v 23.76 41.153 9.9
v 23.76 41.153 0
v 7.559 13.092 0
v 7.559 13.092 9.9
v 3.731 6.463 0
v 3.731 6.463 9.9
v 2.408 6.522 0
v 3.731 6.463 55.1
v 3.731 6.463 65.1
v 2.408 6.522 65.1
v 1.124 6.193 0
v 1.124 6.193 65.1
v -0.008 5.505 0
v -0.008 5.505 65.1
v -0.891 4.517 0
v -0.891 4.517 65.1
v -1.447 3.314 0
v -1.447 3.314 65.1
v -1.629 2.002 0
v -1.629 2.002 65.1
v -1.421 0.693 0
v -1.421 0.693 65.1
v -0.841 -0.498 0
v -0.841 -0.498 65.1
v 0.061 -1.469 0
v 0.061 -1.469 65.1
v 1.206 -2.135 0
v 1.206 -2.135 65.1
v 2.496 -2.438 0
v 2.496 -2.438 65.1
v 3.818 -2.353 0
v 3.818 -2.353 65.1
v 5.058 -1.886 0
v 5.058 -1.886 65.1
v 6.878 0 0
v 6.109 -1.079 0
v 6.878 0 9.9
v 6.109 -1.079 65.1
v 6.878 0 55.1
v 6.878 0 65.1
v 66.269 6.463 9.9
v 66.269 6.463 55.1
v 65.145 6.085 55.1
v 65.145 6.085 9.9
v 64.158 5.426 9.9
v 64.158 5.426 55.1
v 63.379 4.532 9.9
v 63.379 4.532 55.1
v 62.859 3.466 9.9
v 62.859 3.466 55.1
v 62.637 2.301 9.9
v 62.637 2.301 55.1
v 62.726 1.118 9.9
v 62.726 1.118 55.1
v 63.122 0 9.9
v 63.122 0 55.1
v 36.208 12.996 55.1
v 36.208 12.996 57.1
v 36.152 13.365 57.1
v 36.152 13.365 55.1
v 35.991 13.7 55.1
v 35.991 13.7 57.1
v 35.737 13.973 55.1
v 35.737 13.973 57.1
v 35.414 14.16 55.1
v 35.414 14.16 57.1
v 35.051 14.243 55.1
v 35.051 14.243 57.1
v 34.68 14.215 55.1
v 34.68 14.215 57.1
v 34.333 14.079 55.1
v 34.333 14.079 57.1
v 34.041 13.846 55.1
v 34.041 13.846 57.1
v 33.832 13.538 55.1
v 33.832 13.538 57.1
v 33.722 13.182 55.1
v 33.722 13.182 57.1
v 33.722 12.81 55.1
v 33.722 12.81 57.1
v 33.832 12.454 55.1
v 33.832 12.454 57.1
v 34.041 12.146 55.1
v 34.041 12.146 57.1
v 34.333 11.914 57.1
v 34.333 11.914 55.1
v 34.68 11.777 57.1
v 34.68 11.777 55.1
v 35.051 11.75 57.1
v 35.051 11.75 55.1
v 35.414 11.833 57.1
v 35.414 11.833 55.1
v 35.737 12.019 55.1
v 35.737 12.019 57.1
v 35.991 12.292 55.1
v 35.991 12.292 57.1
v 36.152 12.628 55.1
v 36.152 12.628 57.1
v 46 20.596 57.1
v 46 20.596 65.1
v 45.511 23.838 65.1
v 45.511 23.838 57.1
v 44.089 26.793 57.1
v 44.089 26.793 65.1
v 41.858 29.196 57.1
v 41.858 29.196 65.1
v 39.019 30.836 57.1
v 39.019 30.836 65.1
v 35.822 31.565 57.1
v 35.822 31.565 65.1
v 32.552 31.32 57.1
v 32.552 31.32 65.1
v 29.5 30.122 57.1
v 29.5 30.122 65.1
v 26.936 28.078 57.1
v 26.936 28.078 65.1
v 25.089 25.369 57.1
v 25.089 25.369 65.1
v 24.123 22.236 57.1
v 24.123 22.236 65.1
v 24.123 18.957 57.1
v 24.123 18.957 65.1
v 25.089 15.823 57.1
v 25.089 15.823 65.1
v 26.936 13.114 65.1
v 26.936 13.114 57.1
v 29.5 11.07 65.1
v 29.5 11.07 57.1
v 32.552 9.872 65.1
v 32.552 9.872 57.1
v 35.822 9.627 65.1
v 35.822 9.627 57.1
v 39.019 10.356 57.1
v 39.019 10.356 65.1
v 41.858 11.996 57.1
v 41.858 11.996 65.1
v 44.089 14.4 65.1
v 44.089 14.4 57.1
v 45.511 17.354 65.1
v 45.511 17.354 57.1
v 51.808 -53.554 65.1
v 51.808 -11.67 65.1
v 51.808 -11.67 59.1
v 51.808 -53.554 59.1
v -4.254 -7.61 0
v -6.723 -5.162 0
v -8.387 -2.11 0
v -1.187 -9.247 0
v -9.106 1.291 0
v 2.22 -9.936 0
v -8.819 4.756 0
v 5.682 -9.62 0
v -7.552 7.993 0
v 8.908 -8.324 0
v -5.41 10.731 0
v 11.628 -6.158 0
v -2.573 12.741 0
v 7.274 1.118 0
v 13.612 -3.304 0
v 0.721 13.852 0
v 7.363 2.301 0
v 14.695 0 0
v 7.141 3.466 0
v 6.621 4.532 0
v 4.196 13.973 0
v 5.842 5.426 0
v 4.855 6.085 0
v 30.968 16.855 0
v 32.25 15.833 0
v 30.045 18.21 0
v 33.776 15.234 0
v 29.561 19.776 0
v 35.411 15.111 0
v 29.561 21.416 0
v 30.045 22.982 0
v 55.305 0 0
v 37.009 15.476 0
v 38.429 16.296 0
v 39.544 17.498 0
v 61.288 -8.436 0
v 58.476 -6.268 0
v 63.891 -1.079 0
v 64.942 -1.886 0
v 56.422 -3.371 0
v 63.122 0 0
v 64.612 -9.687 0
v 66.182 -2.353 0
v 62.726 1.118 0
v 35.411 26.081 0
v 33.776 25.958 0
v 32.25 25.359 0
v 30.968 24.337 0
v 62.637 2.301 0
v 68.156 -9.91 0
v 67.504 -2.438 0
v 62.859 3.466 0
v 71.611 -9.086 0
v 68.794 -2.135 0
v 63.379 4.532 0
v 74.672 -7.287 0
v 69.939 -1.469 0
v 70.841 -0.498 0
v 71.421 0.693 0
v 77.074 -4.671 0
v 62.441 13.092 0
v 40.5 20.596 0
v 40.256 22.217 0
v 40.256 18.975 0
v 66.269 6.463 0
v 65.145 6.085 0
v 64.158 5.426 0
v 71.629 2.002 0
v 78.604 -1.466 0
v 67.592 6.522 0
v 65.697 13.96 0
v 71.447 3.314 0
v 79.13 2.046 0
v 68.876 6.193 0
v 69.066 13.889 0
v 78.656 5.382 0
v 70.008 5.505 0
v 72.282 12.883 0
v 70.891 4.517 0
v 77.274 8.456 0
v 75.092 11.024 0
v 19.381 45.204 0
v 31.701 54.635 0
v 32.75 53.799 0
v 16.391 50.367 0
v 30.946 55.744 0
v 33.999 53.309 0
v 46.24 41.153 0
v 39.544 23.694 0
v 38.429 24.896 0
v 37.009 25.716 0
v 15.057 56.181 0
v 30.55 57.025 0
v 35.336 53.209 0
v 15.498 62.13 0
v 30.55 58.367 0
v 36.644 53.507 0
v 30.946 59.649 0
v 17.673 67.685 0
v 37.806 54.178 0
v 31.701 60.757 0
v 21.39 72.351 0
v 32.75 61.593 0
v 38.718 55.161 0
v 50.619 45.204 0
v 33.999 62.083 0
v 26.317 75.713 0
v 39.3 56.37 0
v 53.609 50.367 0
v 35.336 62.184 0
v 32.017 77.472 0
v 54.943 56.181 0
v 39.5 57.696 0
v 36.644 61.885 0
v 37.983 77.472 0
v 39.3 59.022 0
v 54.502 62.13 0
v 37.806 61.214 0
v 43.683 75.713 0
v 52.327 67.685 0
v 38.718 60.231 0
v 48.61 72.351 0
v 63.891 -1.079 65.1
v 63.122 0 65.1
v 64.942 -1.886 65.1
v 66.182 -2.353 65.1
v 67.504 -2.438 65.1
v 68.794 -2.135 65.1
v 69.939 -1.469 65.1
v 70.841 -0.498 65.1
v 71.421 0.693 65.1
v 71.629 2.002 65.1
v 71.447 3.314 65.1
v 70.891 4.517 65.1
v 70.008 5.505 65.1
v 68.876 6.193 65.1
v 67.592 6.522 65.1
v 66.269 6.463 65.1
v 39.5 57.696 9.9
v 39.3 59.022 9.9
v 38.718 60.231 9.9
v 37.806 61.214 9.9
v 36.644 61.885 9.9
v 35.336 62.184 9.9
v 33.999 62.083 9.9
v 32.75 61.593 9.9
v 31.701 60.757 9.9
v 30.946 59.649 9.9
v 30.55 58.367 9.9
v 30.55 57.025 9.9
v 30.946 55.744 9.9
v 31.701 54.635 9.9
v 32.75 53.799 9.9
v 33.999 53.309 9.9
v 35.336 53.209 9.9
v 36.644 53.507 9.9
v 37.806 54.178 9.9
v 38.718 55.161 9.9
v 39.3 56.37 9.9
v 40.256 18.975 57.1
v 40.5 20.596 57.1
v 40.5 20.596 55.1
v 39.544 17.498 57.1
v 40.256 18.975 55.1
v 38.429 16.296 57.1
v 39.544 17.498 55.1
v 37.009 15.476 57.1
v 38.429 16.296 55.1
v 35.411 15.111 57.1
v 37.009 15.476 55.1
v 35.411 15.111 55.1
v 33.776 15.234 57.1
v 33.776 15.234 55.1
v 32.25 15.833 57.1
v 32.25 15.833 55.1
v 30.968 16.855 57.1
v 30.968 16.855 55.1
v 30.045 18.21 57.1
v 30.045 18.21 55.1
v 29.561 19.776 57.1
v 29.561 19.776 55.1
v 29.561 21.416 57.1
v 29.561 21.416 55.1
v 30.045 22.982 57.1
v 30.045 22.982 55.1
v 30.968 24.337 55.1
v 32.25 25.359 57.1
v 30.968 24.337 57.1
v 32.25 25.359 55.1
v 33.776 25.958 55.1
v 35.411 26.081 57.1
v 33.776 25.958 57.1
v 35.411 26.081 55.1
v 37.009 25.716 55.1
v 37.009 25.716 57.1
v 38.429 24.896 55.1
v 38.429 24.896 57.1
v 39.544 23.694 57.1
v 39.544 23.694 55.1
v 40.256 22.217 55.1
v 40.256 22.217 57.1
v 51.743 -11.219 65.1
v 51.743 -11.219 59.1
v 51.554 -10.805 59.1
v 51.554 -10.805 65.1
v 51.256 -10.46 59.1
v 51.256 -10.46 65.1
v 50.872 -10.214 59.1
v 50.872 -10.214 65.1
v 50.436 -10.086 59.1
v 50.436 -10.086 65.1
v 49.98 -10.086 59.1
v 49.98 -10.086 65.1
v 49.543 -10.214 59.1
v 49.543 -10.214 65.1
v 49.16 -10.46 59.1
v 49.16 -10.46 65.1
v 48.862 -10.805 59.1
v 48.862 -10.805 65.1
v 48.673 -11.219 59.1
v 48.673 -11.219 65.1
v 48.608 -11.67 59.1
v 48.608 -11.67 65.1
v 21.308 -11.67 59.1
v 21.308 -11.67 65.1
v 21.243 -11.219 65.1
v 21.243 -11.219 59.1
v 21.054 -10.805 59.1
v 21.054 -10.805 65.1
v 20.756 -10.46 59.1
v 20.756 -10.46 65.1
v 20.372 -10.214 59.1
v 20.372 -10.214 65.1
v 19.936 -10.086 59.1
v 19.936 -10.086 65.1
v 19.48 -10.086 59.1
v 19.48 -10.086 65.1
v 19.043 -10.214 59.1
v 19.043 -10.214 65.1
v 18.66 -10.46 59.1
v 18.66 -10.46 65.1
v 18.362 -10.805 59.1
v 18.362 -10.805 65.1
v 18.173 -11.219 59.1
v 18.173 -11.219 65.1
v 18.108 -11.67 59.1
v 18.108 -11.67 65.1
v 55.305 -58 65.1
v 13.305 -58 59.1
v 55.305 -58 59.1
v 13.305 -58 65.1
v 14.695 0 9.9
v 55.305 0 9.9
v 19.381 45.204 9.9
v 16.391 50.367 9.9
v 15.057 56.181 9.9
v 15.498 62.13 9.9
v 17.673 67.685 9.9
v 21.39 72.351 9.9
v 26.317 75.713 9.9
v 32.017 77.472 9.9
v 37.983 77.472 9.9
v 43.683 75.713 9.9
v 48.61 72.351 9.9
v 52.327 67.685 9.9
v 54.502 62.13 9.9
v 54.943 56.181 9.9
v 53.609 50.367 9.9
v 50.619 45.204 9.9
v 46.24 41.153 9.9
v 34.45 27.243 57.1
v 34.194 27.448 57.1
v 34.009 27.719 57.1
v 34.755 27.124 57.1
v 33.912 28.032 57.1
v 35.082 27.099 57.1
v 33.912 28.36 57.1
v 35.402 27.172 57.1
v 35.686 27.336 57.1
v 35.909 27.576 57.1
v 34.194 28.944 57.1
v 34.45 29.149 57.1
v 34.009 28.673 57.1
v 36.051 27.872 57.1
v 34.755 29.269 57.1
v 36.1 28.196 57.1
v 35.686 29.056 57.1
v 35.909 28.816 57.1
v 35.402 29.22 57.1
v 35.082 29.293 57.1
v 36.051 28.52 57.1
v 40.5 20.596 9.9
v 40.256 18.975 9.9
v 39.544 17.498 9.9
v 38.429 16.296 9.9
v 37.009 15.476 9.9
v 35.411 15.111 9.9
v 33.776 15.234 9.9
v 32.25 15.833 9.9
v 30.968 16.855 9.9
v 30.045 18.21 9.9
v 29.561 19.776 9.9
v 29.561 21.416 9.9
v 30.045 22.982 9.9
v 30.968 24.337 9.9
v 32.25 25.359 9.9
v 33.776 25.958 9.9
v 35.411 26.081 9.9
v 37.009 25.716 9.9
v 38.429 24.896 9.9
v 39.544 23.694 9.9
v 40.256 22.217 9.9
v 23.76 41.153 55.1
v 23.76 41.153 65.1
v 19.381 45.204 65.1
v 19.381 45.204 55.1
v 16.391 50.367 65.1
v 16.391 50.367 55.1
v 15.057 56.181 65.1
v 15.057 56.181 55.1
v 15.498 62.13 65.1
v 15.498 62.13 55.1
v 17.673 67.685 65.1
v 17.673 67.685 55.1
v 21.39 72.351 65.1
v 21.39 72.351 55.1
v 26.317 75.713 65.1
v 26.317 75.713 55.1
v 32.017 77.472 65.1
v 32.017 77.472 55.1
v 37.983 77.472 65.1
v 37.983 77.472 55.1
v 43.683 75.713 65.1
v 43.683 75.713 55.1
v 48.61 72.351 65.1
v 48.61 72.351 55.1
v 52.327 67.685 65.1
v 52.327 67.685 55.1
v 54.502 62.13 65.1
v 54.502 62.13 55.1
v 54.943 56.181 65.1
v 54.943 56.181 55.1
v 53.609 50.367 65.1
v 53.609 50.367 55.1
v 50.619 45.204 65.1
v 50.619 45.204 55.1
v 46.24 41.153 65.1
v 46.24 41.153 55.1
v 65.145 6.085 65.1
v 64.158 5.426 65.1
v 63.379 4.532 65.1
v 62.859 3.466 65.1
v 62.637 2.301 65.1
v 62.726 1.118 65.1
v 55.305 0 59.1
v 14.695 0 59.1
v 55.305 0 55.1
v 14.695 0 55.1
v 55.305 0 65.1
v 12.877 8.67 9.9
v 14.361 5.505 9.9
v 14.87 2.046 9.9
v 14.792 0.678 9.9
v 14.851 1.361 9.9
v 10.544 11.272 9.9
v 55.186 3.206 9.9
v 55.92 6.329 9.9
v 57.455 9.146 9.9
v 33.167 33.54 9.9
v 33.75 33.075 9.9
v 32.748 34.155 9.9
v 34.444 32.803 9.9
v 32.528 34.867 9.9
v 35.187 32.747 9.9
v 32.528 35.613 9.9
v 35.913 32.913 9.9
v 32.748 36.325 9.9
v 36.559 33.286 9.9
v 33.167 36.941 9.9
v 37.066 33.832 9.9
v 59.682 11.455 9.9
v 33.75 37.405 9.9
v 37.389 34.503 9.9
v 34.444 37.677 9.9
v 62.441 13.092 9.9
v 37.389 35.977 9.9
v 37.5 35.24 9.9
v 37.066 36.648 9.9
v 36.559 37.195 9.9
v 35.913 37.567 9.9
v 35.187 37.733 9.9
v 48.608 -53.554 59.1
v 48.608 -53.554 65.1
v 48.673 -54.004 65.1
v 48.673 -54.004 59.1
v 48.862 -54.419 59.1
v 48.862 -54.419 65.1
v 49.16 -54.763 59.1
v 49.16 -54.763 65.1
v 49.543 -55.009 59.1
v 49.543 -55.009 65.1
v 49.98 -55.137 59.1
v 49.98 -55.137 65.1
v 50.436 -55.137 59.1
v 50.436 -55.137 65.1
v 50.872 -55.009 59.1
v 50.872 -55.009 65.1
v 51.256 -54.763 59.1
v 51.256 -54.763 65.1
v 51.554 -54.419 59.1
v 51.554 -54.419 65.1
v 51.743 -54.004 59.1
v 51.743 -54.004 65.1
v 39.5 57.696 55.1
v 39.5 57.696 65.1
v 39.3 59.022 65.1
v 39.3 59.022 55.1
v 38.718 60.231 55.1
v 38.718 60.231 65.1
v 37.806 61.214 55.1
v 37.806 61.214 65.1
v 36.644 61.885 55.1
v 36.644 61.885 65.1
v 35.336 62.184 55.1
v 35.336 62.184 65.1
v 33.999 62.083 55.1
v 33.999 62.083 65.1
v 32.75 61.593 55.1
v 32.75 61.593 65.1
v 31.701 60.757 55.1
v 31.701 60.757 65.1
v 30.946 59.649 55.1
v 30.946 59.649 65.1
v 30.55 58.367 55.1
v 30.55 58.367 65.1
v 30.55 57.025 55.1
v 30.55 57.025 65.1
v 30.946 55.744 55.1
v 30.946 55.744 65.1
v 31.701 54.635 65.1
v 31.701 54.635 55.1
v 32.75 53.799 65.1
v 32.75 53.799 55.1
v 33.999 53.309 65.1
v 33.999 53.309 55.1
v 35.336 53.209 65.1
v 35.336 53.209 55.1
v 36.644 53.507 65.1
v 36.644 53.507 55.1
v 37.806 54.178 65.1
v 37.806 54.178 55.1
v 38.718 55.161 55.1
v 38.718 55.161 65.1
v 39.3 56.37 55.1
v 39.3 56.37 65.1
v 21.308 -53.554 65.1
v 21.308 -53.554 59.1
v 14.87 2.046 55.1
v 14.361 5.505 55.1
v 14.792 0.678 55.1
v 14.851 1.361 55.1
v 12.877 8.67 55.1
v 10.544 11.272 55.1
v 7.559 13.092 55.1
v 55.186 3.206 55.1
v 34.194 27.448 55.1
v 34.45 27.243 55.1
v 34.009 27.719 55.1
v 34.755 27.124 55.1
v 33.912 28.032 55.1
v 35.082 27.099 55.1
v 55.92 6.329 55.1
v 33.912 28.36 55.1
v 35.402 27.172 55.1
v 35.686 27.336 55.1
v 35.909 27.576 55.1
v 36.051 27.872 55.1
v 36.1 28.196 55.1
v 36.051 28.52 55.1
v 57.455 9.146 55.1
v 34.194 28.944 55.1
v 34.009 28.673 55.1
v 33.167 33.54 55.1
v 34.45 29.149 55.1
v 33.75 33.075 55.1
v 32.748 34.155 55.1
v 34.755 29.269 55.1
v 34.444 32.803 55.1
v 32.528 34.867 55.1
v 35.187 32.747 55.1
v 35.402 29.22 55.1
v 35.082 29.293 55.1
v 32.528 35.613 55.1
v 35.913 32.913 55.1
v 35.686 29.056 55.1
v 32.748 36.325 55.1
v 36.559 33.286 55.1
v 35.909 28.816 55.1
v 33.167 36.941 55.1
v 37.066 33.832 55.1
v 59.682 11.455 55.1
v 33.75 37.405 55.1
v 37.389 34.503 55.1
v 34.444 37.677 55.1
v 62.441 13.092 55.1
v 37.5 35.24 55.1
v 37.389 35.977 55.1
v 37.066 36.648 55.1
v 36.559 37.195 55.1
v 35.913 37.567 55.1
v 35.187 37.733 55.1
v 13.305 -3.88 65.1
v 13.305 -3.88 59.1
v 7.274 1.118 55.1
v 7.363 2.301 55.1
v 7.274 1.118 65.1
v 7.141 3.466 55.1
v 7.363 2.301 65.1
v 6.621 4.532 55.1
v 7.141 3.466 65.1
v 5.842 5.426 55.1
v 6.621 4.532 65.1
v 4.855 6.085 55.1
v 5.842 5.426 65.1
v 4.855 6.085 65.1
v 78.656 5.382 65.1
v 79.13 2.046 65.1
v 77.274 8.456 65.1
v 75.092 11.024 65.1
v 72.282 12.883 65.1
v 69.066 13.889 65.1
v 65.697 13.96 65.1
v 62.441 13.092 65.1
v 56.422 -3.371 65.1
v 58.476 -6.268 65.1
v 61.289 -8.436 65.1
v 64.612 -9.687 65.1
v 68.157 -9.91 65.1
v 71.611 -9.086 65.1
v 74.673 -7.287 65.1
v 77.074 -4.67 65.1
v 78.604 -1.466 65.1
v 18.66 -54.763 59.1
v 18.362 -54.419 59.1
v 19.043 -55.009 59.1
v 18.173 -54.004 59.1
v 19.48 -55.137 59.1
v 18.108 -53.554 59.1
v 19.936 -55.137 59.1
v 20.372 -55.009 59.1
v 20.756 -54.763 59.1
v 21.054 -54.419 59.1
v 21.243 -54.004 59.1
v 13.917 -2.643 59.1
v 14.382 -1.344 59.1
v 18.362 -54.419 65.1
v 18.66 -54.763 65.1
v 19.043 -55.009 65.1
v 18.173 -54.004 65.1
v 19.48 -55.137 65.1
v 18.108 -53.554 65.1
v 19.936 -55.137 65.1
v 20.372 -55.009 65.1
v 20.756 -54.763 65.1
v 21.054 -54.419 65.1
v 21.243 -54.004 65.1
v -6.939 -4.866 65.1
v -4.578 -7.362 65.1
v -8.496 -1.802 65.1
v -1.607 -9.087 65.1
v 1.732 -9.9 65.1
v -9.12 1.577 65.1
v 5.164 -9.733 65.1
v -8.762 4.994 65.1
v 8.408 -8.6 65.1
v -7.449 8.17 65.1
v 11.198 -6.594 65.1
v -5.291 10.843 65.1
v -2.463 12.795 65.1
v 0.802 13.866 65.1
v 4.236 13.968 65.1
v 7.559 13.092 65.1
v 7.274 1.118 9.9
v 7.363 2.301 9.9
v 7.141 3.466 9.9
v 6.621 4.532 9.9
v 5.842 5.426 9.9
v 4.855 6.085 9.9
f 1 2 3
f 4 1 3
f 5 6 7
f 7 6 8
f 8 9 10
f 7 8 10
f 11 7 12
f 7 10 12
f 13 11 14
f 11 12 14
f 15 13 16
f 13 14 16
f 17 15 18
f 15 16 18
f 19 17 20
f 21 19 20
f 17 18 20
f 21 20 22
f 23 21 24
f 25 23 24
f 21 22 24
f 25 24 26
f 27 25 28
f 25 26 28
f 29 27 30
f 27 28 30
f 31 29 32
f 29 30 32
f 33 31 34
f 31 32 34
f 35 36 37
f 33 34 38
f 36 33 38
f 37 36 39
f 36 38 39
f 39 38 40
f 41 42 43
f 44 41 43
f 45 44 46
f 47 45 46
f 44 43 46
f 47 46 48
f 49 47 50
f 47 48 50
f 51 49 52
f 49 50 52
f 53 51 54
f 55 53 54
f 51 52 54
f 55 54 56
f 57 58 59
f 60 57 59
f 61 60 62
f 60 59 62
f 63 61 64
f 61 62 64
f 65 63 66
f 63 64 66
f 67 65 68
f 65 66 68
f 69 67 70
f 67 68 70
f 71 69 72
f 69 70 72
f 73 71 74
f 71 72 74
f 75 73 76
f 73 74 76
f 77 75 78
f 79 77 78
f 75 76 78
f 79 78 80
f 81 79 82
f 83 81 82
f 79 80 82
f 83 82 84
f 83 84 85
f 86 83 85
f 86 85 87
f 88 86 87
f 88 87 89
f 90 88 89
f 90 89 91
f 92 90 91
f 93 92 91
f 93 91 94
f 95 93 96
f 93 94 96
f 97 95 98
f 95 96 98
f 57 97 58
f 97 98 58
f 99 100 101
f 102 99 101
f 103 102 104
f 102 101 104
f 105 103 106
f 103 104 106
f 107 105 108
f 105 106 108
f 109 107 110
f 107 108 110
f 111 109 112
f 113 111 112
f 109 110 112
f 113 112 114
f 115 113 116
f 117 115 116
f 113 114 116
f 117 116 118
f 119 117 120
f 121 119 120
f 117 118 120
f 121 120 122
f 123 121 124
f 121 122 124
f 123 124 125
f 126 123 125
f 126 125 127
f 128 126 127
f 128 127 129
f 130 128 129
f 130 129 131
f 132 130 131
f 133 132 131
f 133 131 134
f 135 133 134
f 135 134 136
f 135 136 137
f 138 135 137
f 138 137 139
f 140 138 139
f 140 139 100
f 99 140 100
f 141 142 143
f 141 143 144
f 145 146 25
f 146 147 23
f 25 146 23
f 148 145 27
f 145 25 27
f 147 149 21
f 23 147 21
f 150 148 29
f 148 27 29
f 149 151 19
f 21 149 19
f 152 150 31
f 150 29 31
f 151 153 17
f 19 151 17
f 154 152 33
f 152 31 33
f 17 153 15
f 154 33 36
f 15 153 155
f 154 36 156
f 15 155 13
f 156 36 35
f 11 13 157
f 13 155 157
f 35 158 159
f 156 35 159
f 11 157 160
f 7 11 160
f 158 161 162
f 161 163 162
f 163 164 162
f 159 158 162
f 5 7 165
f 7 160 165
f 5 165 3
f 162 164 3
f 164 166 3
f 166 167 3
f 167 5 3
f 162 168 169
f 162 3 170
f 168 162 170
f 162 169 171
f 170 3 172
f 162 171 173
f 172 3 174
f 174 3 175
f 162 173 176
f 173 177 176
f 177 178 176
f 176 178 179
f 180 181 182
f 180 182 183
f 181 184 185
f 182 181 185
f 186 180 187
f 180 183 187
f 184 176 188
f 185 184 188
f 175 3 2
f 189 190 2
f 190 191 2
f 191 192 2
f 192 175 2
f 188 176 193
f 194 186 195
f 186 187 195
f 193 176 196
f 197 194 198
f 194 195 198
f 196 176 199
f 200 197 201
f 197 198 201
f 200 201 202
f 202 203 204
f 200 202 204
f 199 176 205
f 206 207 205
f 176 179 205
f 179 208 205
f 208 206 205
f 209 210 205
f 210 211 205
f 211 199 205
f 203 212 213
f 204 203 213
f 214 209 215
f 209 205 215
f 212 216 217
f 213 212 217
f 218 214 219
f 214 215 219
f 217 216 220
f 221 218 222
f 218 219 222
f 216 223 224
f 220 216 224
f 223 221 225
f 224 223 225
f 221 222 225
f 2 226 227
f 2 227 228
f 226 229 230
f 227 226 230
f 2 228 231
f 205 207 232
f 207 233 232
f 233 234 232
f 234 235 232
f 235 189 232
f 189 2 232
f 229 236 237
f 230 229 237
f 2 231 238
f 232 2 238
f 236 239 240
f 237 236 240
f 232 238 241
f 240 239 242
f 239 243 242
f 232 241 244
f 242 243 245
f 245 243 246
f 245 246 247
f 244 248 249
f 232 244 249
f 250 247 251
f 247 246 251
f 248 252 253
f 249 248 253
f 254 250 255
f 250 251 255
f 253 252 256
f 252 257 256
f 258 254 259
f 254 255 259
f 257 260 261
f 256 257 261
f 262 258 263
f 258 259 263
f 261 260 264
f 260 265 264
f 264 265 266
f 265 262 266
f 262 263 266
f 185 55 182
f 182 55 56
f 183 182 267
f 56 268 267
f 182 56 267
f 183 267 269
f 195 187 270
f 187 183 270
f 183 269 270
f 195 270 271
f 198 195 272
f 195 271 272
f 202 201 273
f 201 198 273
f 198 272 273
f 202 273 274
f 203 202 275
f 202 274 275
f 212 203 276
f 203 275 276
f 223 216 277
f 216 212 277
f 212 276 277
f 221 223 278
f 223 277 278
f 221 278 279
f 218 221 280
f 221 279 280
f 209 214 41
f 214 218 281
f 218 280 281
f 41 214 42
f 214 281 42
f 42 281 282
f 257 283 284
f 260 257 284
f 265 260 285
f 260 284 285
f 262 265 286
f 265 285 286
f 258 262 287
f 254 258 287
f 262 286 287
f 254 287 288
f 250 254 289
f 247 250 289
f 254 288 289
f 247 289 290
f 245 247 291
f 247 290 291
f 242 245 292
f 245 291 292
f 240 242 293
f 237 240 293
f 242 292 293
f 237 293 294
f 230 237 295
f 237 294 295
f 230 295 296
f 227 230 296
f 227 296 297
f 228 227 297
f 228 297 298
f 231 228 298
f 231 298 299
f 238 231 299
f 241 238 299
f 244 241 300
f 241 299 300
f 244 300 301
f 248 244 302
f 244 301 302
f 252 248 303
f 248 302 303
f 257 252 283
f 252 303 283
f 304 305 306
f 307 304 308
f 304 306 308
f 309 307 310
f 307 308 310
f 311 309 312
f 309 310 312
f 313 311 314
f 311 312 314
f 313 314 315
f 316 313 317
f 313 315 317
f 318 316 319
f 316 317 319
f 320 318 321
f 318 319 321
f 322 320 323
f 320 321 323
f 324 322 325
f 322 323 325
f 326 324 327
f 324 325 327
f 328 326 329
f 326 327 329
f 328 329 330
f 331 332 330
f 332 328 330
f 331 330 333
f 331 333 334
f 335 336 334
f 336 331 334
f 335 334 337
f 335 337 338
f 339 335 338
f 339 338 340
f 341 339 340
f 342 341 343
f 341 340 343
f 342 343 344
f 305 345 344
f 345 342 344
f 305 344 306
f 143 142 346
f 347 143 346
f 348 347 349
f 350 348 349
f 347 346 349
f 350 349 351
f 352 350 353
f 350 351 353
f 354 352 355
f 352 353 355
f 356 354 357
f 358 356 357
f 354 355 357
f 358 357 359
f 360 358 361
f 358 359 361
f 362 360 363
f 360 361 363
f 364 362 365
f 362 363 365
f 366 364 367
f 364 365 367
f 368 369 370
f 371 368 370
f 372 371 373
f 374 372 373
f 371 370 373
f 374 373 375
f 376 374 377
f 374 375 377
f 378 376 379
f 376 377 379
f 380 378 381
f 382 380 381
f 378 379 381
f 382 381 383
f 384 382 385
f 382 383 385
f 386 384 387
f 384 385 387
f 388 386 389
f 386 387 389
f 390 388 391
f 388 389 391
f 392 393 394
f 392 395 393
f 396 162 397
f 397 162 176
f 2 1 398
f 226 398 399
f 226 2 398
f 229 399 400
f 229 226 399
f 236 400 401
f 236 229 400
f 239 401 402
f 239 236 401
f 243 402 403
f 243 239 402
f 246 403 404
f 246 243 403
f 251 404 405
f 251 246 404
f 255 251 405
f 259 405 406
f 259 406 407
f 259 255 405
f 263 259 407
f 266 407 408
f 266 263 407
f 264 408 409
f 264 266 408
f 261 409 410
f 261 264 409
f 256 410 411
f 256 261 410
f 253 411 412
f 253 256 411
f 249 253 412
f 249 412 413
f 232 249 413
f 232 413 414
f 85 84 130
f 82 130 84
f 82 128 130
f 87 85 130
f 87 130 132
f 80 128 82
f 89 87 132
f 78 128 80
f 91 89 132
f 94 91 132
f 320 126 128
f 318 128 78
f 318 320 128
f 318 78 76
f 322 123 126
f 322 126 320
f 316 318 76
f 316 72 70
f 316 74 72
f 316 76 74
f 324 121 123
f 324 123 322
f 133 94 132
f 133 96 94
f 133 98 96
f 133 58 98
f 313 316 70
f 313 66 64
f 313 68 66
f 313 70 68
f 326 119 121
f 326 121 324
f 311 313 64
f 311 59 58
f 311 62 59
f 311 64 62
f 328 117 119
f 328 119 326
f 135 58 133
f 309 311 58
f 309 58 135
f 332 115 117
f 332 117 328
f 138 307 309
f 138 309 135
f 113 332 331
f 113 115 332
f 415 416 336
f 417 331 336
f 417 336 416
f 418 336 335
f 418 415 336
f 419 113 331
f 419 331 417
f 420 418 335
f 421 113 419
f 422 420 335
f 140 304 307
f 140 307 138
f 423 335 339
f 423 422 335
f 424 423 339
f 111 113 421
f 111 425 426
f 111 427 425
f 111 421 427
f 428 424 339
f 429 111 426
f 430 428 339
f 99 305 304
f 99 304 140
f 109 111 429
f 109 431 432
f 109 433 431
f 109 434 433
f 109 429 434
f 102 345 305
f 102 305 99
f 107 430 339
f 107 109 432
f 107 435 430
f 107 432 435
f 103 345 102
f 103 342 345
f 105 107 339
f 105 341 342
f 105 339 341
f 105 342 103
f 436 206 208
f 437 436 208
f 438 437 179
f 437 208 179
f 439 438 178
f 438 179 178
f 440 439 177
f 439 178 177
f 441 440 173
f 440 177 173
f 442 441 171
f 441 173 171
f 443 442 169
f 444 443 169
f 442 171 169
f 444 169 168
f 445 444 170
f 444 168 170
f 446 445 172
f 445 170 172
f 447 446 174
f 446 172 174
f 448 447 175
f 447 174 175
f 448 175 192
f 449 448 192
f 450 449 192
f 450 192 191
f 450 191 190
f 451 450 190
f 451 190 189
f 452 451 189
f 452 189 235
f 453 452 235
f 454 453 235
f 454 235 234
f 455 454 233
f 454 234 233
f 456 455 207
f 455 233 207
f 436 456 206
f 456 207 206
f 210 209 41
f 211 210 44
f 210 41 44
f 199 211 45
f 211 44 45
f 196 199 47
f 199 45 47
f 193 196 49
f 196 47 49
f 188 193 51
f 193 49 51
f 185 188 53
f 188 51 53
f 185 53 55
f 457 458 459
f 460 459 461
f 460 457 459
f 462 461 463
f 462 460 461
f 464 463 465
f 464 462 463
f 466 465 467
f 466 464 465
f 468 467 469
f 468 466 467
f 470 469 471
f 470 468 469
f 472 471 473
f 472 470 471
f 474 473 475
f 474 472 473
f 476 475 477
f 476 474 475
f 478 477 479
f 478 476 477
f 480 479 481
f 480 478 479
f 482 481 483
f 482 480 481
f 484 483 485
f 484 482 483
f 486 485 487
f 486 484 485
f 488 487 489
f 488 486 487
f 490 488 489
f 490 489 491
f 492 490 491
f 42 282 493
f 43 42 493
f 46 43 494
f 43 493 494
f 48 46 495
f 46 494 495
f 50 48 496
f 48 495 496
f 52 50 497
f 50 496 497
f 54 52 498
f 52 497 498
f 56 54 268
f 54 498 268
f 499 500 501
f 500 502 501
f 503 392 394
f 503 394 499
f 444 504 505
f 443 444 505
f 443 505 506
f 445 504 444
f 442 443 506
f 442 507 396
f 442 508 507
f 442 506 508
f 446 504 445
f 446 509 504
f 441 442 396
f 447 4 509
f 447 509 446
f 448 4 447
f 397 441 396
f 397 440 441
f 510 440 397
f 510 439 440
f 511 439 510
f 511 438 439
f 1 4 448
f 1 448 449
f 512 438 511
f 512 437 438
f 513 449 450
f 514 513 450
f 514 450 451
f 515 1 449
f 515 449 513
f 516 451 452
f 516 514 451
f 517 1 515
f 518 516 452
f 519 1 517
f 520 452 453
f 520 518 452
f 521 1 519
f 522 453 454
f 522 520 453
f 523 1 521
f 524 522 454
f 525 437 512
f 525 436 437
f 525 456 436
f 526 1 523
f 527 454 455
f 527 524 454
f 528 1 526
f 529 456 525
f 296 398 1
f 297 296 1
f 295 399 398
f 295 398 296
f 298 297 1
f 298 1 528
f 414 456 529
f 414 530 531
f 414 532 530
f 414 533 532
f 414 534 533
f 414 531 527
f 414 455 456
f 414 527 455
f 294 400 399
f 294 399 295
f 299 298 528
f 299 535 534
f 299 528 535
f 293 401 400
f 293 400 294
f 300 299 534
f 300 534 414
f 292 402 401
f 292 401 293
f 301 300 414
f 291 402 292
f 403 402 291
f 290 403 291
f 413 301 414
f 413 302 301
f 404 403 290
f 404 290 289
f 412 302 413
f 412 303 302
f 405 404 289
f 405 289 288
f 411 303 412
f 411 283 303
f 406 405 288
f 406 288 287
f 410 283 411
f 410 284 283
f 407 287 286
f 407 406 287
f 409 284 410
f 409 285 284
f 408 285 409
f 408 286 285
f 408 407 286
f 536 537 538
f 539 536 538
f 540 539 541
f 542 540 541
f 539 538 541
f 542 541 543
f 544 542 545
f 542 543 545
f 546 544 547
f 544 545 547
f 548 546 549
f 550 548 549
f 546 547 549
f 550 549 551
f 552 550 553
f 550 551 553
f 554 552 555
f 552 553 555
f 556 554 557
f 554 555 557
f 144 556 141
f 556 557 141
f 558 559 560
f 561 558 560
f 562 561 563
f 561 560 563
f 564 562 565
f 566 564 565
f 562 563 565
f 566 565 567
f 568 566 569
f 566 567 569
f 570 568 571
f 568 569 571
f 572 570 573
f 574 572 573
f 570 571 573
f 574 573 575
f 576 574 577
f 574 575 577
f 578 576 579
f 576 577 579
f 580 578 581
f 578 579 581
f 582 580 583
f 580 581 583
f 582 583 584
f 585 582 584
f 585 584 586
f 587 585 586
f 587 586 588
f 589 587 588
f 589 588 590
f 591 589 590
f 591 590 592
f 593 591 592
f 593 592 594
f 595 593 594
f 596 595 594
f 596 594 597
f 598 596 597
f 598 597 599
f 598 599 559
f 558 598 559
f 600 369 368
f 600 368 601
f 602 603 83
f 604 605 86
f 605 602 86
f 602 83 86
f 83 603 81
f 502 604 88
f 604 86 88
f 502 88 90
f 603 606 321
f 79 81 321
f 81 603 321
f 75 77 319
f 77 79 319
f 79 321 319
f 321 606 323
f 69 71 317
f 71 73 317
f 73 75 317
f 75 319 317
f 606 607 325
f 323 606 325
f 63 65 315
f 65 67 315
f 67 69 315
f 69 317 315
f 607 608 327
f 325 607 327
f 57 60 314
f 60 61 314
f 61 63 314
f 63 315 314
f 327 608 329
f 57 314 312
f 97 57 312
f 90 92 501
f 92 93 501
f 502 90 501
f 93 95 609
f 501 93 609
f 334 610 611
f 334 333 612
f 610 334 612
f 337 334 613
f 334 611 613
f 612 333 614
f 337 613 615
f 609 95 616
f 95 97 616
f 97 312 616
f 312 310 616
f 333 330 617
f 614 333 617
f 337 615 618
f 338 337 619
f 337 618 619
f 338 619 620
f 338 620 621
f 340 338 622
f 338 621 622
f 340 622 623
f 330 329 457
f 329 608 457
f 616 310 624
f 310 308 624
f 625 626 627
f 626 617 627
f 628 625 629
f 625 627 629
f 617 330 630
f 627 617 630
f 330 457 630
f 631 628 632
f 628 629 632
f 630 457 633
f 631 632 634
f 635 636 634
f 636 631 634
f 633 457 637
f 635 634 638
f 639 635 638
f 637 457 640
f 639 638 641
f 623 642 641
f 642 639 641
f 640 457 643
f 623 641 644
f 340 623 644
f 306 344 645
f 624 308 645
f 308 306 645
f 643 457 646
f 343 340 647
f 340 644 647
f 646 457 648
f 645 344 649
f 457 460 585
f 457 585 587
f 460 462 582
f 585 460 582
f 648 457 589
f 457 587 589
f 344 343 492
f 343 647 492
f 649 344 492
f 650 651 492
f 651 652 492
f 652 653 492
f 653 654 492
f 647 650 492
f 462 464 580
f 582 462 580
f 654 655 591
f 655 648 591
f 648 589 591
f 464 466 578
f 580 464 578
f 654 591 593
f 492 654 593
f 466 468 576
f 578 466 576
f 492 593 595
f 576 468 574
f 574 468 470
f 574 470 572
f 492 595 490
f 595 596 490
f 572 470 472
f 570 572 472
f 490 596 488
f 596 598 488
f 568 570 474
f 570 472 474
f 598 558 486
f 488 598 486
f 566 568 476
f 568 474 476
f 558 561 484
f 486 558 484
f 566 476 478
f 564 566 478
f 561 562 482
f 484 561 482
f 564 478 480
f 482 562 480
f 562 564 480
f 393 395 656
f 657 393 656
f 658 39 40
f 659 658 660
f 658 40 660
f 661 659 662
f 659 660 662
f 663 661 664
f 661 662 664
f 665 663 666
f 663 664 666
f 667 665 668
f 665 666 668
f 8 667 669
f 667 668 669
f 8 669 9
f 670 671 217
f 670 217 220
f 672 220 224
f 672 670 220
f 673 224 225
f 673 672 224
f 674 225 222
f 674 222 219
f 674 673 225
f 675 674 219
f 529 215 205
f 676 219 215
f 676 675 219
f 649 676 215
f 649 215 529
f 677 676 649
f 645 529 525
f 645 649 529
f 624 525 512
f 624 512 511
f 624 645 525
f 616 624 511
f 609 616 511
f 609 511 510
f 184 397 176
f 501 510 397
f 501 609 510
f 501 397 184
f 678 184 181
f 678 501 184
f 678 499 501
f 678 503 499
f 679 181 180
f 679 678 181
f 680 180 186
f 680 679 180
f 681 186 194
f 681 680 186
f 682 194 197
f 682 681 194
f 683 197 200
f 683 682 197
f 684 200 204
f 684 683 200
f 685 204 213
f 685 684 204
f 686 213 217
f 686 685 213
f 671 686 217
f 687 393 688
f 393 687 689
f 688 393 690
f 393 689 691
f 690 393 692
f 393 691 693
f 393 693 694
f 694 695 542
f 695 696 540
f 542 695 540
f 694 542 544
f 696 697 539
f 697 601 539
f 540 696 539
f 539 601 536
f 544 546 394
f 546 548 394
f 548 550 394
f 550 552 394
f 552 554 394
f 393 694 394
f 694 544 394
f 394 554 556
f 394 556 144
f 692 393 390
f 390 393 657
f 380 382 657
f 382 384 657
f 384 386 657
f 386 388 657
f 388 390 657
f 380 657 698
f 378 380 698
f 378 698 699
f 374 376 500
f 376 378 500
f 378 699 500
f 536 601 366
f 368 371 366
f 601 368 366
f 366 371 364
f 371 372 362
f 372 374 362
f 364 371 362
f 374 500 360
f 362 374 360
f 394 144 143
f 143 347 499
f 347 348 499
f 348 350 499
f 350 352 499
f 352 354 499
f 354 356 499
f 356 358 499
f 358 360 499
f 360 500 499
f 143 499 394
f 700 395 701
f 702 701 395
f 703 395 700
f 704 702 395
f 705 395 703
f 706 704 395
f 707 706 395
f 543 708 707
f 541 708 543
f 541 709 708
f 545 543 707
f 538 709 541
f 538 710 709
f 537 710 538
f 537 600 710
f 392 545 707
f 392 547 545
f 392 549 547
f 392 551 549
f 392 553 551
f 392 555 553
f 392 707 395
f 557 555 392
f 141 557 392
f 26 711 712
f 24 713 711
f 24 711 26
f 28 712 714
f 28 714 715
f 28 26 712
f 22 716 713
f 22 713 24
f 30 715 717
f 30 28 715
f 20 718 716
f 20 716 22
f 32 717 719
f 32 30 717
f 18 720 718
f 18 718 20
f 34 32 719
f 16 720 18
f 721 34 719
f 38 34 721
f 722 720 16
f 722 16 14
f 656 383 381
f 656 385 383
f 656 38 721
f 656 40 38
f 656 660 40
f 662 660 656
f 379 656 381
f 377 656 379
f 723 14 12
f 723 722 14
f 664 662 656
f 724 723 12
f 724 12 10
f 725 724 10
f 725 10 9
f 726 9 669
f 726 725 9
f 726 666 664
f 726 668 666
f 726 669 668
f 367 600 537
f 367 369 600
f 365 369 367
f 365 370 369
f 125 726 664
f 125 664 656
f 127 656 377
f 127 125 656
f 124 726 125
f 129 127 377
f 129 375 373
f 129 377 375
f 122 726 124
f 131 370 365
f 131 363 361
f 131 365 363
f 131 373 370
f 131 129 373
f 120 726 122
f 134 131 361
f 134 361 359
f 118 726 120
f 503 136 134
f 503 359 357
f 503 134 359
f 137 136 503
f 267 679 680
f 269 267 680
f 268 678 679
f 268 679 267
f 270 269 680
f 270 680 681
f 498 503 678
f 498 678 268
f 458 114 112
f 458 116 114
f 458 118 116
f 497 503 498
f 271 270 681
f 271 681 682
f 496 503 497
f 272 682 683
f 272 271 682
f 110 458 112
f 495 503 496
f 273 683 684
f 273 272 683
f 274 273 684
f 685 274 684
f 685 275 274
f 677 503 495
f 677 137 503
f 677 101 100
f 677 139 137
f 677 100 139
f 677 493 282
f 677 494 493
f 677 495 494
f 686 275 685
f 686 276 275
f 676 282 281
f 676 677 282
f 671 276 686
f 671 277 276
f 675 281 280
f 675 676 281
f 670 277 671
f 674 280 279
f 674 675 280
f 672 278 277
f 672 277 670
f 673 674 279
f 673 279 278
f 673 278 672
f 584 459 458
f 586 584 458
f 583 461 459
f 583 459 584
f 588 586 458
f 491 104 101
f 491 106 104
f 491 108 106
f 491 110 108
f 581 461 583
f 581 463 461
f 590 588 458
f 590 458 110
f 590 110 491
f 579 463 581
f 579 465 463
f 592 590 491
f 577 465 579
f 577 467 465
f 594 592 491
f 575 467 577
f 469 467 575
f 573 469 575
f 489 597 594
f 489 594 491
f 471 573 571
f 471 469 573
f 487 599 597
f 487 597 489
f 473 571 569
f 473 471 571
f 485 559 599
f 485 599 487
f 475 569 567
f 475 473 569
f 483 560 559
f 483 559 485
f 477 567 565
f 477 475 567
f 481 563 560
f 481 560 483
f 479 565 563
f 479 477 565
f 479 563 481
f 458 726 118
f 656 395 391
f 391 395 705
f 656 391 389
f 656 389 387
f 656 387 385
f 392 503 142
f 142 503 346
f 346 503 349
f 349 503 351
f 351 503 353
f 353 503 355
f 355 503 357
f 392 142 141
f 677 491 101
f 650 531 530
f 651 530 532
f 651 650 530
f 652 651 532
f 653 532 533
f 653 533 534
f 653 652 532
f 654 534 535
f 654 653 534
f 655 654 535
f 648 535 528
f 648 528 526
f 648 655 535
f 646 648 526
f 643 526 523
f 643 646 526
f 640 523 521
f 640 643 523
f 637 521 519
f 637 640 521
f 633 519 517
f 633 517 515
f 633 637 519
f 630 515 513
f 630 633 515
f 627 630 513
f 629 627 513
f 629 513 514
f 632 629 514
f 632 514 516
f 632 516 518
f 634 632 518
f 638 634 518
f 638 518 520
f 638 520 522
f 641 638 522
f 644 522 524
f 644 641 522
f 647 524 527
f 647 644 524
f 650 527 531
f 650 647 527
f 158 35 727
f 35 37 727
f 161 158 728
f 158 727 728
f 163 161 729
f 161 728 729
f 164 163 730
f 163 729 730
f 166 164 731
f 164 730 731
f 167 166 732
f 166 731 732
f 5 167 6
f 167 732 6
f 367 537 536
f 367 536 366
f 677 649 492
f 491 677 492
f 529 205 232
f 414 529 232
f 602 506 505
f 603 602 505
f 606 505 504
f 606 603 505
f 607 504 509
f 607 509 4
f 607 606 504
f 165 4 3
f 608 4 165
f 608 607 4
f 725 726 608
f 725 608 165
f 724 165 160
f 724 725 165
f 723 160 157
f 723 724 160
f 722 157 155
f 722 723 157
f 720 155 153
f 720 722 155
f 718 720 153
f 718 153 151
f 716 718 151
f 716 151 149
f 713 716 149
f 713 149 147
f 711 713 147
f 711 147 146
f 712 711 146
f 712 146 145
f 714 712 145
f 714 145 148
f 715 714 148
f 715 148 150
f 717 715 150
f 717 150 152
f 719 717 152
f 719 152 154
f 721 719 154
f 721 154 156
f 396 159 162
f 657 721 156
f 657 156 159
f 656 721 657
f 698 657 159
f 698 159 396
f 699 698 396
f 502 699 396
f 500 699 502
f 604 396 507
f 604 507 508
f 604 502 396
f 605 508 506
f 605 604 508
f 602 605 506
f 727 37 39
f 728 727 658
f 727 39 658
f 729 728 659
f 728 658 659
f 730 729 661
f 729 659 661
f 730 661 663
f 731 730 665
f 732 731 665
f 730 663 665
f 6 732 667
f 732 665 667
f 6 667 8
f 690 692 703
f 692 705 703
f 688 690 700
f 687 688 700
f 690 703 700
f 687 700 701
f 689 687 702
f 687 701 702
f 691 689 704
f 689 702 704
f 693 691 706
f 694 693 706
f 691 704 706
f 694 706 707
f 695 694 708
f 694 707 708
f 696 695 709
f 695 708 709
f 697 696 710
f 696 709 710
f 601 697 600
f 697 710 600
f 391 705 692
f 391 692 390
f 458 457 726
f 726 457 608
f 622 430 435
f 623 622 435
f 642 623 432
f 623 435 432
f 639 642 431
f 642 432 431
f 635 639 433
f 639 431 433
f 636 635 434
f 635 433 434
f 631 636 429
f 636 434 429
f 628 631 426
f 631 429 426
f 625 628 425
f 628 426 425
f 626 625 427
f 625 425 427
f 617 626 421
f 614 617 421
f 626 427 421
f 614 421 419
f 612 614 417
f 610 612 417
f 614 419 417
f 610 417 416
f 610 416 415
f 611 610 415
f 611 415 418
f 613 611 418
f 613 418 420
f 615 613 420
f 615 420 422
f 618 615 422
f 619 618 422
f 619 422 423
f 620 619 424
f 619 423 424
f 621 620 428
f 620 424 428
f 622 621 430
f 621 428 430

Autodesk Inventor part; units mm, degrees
ref_plane "YZ Plane" through (0, 0, 0) normal (1, 0, 0) x (0, 1, 0)
ref_plane "XZ Plane" through (0, 0, 0) normal (0, 1, 0) x (-1, 0, 0)
ref_plane "XY Plane" through (0, 0, 0) normal (0, 0, 1) x (1, 0, 0)
sketch "Sketch1" plane through (0, 0, 0) normal (0, 0, 1) x (1, 0, 0)
  line L0 (0, 0) -> (70, 0)
  line L1 (70, 0) -> (35, 60.6218)
  line L2 (35, 60.6218) -> (0, 0)
  circle A0 centre (35, 20.5961) radius 5.5
  circle A1 centre (35, 57.6961) radius 20
  point P0 (46.2401, 41.1534)
  point P1 (23.7599, 41.1534)
  dimension "d0" = 70
  dimension "d1" = 70
  dimension "d2" = 60
  dimension "d3" = 11
  dimension "d4" = 37.1
  dimension "d5" = 40
extrude "Extrusion1" add sketch "Sketch1" along normal blind 65.1
ref_plane "Work Plane1" through (0, 0, 55.1) normal (0, 0, 1) x (1, 0, 0)
sketch "Sketch2" plane through (0, 0, 55.1) normal (0, 0, 1) x (1, 0, 0)
  line L0 (14.3119, 82.6705) -> (-13.7787, 82.6705)
  line L1 (-13.7787, 82.6705) -> (-13.7787, -9.2093)
  line L2 (-13.7787, -9.2093) -> (82.9291, -9.2093)
  line L3 (82.9291, -9.2093) -> (82.9291, 82.6705)
  line L4 (82.9291, 82.6705) -> (14.3119, 82.6705)
  point P0 (0, 0)
extrude "Extrusion2" cut sketch "Sketch2" against normal blind 45.2
sketch "Sketch3" plane through (0, 0, 65.1) normal (0, 0, 1) x (1, 0, 0)
  arc A0 (46.2401, 41.1534) -> (23.7599, 41.1534) centre (35, 57.6961) ccw projected
  circle A1 centre (35, 57.6961) radius 4.5
  point P0 (0, 0)
  dimension "d11" = 9
extrude "Extrusion3" cut sketch "Sketch3" against normal through all
pattern_circular "Circular Pattern1" count 3 over 360 about axis through (35, 20.5961, 0) along (0, 0, 1) of "Extrusion3"
sketch "Sketch4" plane through (0, 0, 65.1) normal (0, 0, 1) x (1, 0, 0)
  arc A0 (6.8784, 0) -> (3.7314, 6.463) centre (2.8705, 2.0461) ccw projected
  circle A1 centre (2.8705, 2.0461) radius 4.5
  circle A2 centre (2.8705, 2.0461) radius 12
  arc A3 (66.2686, 6.463) -> (63.1216, 0) centre (67.1295, 2.0461) ccw projected
  circle A4 centre (67.1295, 2.0461) radius 4.5
  circle A5 centre (67.1295, 2.0461) radius 12
  point P0 (0, 0)
  point P1 (63.1216, 0)
  point P2 (66.2686, 6.463)
  point P3 (6.8784, 0)
  point P4 (3.7314, 6.463)
  dimension "d17" = 24
  dimension "d18" = 24
extrude "Extrusion4" add sketch "Sketch4" against normal blind 65.1
sketch "Sketch5" plane through (0, 0, 65.1) normal (0, 0, 1) x (1, 0, 0)
  line L0 (23.7599, 41.1534) -> (7.5589, 13.0923) projected
  line L1 (13.3053, -58) -> (55.3053, -58)
  line L2 (55.3053, -58) -> (55.3053, 0)
  line L3 (14.6947, 0) -> (55.3053, 0) projected
  line L4 (13.3053, -58) -> (13.3053, 0)
  line L5 (13.3053, 0) -> (15.6594, 0)
  point P0 (0, 0)
  dimension "d22" = 42
  dimension "d24" = 0
  dimension "d26" = 58
extrude "Extrusion5" add sketch "Sketch5" against normal blind 6
sketch "Sketch6" plane through (0, 0, 65.1) normal (0, 0, 1) x (1, 0, 0)
  circle A0 centre (35, 20.5961) radius 5.5 projected
  circle A1 centre (35, 20.5961) radius 11
  point P0 (0, 0)
  dimension "d29" = 22
extrude "Extrusion6" cut sketch "Sketch6" against normal blind 8
sketch "Sketch7" plane through (35, 20.5961, 57.1) normal (0, 0, 1) x (1, 0, 0)
  circle A0 centre (-0.0422, -7.6) radius 1.25
  circle A1 centre (0, 0) radius 5.5 projected
  point P0 (-35, -20.5961)
  dimension "d32" = 2.5
  dimension "d33" = 7.6
extrude "Extrusion7" cut sketch "Sketch7" against normal blind 5 contours A0
sketch "Sketch8" plane through (0, 0, 65.1) normal (0, 0, 1) x (1, 0, 0)
  line L0 (18.1078, -53.5536) -> (18.1078, -11.6696)
  line L1 (18.1078, -11.6696) -> (21.3078, -11.6696)
  line L2 (21.3078, -11.6696) -> (21.3078, -53.5536)
  line L3 (21.3078, -53.5536) -> (18.1078, -53.5536)
  line L4 (51.8078, -11.6696) -> (51.8078, -53.5536)
  line L5 (51.8078, -53.5536) -> (48.6078, -53.5536)
  line L6 (48.6078, -53.5536) -> (48.6078, -11.6696)
  line L7 (48.6078, -11.6696) -> (51.8078, -11.6696)
  circle A0 centre (34.9578, 12.9961) radius 1.25 projected
  arc A1 (48.6078, -53.5536) -> (51.8078, -53.5536) centre (50.2078, -53.5536) ccw
  arc A2 (51.8078, -11.6696) -> (48.6078, -11.6696) centre (50.2078, -11.6696) ccw
  arc A3 (18.1078, -53.5536) -> (21.3078, -53.5536) centre (19.7078, -53.5536) ccw
  arc A4 (21.3078, -11.6696) -> (18.1078, -11.6696) centre (19.7078, -11.6696) ccw
  point P0 (0, 0)
  point P1 (21.7083, -32.6116)
  point P2 (52.2083, -32.6116)
  dimension "d36" = 3.2
  dimension "d37" = 3.2
  dimension "d38" = 30.5
  dimension "d41" = 13.65
  dimension "d42" = 13.65
extrude "Extrusion8" cut sketch "Sketch8" against normal blind 10 contours L0 L1 L2 L3 | L3 A3 | A4 L1 | L4 L5 L6 L7 | L7 A2 | A1 L5
sketch "Sketch9" plane through (0, 0, 65.1) normal (0, 0, 1) x (1, 0, 0)
  circle A0 centre (35, 28.1961) radius 1.1
  circle A1 centre (35, 20.5961) radius 5.5 projected
  point P0 (0, 0)
  dimension "d45" = 2.2
  dimension "d46" = 7.6
extrude "Extrusion9" cut sketch "Sketch9" against normal blind 10 contours A0
sketch "Sketch10" plane through (0, 0, 65.1) normal (0, 0, 1) x (1, 0, 0)
  circle A0 centre (35, 35.2401) radius 2.5
  point P0 (0, 0)
  dimension "d49" = 5
extrude "Extrusion10" add sketch "Sketch10" against normal blind 65
properties part number "Platform 1 piece"
